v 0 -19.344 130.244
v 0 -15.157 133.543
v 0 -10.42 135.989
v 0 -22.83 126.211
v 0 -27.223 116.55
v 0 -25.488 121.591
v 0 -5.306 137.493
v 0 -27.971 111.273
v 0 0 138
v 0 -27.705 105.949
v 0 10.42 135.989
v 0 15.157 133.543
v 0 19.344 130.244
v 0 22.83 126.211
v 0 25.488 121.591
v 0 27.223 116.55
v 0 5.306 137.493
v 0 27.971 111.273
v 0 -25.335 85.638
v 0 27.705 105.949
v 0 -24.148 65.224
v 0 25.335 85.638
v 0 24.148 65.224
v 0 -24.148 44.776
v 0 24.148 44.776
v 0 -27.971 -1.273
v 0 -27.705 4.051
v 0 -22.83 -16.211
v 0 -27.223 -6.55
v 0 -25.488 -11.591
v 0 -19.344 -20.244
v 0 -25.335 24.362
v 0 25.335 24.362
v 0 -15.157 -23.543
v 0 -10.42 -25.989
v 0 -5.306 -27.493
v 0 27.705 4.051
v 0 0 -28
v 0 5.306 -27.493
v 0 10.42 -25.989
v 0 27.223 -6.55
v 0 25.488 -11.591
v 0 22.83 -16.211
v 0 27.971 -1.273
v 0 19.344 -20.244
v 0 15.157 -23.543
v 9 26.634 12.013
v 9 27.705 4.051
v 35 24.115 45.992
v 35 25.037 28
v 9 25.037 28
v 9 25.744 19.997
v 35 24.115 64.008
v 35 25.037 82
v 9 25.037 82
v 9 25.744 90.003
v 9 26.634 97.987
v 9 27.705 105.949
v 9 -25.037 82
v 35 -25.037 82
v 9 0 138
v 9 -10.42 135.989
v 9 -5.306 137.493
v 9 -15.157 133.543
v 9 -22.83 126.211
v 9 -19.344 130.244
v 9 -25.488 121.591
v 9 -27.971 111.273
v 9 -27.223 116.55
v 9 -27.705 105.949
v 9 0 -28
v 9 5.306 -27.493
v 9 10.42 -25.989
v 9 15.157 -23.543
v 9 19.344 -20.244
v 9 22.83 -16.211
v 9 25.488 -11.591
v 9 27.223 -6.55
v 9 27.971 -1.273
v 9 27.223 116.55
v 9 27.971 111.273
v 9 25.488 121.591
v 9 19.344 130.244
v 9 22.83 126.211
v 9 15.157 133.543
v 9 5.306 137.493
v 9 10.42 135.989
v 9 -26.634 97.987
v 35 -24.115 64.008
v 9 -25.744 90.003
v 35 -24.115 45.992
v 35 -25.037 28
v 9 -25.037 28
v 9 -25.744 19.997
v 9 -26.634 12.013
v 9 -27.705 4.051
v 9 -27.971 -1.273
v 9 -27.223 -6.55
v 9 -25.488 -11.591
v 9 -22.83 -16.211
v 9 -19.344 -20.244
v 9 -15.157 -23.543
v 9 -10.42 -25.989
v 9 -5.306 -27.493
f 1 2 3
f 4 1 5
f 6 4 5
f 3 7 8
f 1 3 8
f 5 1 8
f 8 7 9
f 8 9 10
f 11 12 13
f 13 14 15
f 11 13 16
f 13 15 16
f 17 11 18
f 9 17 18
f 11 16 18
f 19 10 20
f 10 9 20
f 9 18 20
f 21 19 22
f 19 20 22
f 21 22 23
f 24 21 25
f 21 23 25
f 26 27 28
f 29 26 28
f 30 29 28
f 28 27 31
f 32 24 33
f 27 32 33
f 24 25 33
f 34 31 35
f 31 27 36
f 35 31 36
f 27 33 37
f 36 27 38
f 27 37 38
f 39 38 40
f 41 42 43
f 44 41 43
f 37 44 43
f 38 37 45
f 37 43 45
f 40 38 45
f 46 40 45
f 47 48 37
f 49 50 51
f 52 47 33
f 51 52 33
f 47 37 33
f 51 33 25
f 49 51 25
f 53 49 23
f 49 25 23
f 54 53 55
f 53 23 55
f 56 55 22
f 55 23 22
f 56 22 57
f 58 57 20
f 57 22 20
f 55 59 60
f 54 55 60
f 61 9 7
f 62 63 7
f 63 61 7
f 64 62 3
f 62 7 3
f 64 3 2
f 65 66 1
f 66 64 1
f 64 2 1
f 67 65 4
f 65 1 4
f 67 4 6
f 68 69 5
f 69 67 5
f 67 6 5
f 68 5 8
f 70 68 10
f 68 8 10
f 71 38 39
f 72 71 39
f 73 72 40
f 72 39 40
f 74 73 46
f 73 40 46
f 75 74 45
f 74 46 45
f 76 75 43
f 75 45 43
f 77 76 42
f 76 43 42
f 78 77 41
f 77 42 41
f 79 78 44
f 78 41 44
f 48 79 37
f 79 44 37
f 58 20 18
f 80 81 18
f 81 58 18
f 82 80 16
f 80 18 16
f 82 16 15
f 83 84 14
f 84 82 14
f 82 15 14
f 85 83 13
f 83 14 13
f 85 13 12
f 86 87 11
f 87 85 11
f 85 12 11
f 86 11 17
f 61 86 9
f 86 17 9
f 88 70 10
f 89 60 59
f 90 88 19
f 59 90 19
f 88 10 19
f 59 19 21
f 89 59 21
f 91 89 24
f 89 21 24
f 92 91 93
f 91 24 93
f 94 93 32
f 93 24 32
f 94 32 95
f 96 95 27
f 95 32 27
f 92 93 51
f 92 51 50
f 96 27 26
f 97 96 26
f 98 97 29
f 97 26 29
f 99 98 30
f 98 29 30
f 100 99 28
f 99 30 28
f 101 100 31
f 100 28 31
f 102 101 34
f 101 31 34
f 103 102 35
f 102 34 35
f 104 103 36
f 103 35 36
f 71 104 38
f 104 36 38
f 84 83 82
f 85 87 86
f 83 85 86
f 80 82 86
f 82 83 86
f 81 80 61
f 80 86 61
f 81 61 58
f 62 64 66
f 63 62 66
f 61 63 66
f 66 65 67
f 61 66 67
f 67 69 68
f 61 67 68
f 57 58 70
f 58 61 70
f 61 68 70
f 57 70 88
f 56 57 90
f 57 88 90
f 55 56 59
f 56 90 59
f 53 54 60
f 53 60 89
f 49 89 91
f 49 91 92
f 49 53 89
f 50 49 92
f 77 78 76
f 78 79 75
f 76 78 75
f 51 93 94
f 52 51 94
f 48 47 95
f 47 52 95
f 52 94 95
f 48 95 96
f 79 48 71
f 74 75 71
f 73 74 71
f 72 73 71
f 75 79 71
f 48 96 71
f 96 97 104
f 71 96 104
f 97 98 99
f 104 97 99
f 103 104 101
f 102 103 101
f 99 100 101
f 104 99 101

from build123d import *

# Parameters (mm, degrees)
BOSS_EXTRUDE1_DEPTH     = 35
CUT_EXTRUDE1_DEPTH      = 146.0965196
CUT_EXTRUDE1_DEPTH_BACK = 146.0965196
SKETCH4_W               = 52
SKETCH4_H               = 56


with BuildPart() as part:
    # Sketch1 → Boss-Extrude1 (new body)
    with BuildSketch(Plane(origin=(0, 0, 0), x_dir=(0, 0, -1), z_dir=(1, 0, 0))):
        with BuildLine():
            ThreePointArc((-4.051298915, 27.705360079), (-21.182969216, 18.310702204), (-28, 0))
            Line((-28, 0), (28, 0))
            ThreePointArc((28, 0), (18.310702204, 21.182969216), (-4.051298915, 27.705360079))
        make_face()
        with BuildLine():
            Line((28, 0), (-28, 0))
            ThreePointArc((-28, 0), (-21.182969216, -18.310702204), (-4.051298915, -27.705360079))
            ThreePointArc((-4.051298915, -27.705360079), (18.310702204, -21.182969216), (28, 0))
        make_face()
        with BuildLine():
            ThreePointArc((-105.948701085, 27.705360079), (-88.817030784, 18.310702204), (-82, 0))
            Line((-82, 0), (-28, 0))
            ThreePointArc((-28, 0), (-21.182969216, 18.310702204), (-4.051298915, 27.705360079))
            ThreePointArc((-4.051298915, 27.705360079), (-55, 24), (-105.948701085, 27.705360079))
        make_face()
        with BuildLine():
            Line((-28, 0), (-82, 0))
            ThreePointArc((-82, 0), (-88.817030784, -18.310702204), (-105.948701085, -27.705360079))
            ThreePointArc((-105.948701085, -27.705360079), (-55, -24), (-4.051298915, -27.705360079))
            ThreePointArc((-4.051298915, -27.705360079), (-21.182969216, -18.310702204), (-28, 0))
        make_face()
        with BuildLine():
            ThreePointArc((-105.948701085, 27.705360079), (-128.310702204, 21.182969216), (-138, 0))
            Line((-138, 0), (-82, 0))
            ThreePointArc((-82, 0), (-88.817030784, 18.310702204), (-105.948701085, 27.705360079))
        make_face()
        with BuildLine():
            Line((-82, 0), (-138, 0))
            ThreePointArc((-138, 0), (-128.310702204, -21.182969216), (-105.948701085, -27.705360079))
            ThreePointArc((-105.948701085, -27.705360079), (-88.817030784, -18.310702204), (-82, 0))
        make_face()
    extrude(amount=BOSS_EXTRUDE1_DEPTH)

    # Sketch4 → Cut-Extrude1 (cut, two sides: drawn at the far end of the back side and taken through both)
    with BuildSketch(Plane(origin=(0, 0, 0), x_dir=(1, 0, 0), z_dir=(0, 1, 0)).offset(-CUT_EXTRUDE1_DEPTH_BACK)):
        with Locations((35, 0)):
            Rectangle(SKETCH4_W, SKETCH4_H)
        with Locations((35, -110)):
            Rectangle(SKETCH4_W, SKETCH4_H)
    extrude(amount=CUT_EXTRUDE1_DEPTH + CUT_EXTRUDE1_DEPTH_BACK, mode=Mode.SUBTRACT)


solid = part.part
